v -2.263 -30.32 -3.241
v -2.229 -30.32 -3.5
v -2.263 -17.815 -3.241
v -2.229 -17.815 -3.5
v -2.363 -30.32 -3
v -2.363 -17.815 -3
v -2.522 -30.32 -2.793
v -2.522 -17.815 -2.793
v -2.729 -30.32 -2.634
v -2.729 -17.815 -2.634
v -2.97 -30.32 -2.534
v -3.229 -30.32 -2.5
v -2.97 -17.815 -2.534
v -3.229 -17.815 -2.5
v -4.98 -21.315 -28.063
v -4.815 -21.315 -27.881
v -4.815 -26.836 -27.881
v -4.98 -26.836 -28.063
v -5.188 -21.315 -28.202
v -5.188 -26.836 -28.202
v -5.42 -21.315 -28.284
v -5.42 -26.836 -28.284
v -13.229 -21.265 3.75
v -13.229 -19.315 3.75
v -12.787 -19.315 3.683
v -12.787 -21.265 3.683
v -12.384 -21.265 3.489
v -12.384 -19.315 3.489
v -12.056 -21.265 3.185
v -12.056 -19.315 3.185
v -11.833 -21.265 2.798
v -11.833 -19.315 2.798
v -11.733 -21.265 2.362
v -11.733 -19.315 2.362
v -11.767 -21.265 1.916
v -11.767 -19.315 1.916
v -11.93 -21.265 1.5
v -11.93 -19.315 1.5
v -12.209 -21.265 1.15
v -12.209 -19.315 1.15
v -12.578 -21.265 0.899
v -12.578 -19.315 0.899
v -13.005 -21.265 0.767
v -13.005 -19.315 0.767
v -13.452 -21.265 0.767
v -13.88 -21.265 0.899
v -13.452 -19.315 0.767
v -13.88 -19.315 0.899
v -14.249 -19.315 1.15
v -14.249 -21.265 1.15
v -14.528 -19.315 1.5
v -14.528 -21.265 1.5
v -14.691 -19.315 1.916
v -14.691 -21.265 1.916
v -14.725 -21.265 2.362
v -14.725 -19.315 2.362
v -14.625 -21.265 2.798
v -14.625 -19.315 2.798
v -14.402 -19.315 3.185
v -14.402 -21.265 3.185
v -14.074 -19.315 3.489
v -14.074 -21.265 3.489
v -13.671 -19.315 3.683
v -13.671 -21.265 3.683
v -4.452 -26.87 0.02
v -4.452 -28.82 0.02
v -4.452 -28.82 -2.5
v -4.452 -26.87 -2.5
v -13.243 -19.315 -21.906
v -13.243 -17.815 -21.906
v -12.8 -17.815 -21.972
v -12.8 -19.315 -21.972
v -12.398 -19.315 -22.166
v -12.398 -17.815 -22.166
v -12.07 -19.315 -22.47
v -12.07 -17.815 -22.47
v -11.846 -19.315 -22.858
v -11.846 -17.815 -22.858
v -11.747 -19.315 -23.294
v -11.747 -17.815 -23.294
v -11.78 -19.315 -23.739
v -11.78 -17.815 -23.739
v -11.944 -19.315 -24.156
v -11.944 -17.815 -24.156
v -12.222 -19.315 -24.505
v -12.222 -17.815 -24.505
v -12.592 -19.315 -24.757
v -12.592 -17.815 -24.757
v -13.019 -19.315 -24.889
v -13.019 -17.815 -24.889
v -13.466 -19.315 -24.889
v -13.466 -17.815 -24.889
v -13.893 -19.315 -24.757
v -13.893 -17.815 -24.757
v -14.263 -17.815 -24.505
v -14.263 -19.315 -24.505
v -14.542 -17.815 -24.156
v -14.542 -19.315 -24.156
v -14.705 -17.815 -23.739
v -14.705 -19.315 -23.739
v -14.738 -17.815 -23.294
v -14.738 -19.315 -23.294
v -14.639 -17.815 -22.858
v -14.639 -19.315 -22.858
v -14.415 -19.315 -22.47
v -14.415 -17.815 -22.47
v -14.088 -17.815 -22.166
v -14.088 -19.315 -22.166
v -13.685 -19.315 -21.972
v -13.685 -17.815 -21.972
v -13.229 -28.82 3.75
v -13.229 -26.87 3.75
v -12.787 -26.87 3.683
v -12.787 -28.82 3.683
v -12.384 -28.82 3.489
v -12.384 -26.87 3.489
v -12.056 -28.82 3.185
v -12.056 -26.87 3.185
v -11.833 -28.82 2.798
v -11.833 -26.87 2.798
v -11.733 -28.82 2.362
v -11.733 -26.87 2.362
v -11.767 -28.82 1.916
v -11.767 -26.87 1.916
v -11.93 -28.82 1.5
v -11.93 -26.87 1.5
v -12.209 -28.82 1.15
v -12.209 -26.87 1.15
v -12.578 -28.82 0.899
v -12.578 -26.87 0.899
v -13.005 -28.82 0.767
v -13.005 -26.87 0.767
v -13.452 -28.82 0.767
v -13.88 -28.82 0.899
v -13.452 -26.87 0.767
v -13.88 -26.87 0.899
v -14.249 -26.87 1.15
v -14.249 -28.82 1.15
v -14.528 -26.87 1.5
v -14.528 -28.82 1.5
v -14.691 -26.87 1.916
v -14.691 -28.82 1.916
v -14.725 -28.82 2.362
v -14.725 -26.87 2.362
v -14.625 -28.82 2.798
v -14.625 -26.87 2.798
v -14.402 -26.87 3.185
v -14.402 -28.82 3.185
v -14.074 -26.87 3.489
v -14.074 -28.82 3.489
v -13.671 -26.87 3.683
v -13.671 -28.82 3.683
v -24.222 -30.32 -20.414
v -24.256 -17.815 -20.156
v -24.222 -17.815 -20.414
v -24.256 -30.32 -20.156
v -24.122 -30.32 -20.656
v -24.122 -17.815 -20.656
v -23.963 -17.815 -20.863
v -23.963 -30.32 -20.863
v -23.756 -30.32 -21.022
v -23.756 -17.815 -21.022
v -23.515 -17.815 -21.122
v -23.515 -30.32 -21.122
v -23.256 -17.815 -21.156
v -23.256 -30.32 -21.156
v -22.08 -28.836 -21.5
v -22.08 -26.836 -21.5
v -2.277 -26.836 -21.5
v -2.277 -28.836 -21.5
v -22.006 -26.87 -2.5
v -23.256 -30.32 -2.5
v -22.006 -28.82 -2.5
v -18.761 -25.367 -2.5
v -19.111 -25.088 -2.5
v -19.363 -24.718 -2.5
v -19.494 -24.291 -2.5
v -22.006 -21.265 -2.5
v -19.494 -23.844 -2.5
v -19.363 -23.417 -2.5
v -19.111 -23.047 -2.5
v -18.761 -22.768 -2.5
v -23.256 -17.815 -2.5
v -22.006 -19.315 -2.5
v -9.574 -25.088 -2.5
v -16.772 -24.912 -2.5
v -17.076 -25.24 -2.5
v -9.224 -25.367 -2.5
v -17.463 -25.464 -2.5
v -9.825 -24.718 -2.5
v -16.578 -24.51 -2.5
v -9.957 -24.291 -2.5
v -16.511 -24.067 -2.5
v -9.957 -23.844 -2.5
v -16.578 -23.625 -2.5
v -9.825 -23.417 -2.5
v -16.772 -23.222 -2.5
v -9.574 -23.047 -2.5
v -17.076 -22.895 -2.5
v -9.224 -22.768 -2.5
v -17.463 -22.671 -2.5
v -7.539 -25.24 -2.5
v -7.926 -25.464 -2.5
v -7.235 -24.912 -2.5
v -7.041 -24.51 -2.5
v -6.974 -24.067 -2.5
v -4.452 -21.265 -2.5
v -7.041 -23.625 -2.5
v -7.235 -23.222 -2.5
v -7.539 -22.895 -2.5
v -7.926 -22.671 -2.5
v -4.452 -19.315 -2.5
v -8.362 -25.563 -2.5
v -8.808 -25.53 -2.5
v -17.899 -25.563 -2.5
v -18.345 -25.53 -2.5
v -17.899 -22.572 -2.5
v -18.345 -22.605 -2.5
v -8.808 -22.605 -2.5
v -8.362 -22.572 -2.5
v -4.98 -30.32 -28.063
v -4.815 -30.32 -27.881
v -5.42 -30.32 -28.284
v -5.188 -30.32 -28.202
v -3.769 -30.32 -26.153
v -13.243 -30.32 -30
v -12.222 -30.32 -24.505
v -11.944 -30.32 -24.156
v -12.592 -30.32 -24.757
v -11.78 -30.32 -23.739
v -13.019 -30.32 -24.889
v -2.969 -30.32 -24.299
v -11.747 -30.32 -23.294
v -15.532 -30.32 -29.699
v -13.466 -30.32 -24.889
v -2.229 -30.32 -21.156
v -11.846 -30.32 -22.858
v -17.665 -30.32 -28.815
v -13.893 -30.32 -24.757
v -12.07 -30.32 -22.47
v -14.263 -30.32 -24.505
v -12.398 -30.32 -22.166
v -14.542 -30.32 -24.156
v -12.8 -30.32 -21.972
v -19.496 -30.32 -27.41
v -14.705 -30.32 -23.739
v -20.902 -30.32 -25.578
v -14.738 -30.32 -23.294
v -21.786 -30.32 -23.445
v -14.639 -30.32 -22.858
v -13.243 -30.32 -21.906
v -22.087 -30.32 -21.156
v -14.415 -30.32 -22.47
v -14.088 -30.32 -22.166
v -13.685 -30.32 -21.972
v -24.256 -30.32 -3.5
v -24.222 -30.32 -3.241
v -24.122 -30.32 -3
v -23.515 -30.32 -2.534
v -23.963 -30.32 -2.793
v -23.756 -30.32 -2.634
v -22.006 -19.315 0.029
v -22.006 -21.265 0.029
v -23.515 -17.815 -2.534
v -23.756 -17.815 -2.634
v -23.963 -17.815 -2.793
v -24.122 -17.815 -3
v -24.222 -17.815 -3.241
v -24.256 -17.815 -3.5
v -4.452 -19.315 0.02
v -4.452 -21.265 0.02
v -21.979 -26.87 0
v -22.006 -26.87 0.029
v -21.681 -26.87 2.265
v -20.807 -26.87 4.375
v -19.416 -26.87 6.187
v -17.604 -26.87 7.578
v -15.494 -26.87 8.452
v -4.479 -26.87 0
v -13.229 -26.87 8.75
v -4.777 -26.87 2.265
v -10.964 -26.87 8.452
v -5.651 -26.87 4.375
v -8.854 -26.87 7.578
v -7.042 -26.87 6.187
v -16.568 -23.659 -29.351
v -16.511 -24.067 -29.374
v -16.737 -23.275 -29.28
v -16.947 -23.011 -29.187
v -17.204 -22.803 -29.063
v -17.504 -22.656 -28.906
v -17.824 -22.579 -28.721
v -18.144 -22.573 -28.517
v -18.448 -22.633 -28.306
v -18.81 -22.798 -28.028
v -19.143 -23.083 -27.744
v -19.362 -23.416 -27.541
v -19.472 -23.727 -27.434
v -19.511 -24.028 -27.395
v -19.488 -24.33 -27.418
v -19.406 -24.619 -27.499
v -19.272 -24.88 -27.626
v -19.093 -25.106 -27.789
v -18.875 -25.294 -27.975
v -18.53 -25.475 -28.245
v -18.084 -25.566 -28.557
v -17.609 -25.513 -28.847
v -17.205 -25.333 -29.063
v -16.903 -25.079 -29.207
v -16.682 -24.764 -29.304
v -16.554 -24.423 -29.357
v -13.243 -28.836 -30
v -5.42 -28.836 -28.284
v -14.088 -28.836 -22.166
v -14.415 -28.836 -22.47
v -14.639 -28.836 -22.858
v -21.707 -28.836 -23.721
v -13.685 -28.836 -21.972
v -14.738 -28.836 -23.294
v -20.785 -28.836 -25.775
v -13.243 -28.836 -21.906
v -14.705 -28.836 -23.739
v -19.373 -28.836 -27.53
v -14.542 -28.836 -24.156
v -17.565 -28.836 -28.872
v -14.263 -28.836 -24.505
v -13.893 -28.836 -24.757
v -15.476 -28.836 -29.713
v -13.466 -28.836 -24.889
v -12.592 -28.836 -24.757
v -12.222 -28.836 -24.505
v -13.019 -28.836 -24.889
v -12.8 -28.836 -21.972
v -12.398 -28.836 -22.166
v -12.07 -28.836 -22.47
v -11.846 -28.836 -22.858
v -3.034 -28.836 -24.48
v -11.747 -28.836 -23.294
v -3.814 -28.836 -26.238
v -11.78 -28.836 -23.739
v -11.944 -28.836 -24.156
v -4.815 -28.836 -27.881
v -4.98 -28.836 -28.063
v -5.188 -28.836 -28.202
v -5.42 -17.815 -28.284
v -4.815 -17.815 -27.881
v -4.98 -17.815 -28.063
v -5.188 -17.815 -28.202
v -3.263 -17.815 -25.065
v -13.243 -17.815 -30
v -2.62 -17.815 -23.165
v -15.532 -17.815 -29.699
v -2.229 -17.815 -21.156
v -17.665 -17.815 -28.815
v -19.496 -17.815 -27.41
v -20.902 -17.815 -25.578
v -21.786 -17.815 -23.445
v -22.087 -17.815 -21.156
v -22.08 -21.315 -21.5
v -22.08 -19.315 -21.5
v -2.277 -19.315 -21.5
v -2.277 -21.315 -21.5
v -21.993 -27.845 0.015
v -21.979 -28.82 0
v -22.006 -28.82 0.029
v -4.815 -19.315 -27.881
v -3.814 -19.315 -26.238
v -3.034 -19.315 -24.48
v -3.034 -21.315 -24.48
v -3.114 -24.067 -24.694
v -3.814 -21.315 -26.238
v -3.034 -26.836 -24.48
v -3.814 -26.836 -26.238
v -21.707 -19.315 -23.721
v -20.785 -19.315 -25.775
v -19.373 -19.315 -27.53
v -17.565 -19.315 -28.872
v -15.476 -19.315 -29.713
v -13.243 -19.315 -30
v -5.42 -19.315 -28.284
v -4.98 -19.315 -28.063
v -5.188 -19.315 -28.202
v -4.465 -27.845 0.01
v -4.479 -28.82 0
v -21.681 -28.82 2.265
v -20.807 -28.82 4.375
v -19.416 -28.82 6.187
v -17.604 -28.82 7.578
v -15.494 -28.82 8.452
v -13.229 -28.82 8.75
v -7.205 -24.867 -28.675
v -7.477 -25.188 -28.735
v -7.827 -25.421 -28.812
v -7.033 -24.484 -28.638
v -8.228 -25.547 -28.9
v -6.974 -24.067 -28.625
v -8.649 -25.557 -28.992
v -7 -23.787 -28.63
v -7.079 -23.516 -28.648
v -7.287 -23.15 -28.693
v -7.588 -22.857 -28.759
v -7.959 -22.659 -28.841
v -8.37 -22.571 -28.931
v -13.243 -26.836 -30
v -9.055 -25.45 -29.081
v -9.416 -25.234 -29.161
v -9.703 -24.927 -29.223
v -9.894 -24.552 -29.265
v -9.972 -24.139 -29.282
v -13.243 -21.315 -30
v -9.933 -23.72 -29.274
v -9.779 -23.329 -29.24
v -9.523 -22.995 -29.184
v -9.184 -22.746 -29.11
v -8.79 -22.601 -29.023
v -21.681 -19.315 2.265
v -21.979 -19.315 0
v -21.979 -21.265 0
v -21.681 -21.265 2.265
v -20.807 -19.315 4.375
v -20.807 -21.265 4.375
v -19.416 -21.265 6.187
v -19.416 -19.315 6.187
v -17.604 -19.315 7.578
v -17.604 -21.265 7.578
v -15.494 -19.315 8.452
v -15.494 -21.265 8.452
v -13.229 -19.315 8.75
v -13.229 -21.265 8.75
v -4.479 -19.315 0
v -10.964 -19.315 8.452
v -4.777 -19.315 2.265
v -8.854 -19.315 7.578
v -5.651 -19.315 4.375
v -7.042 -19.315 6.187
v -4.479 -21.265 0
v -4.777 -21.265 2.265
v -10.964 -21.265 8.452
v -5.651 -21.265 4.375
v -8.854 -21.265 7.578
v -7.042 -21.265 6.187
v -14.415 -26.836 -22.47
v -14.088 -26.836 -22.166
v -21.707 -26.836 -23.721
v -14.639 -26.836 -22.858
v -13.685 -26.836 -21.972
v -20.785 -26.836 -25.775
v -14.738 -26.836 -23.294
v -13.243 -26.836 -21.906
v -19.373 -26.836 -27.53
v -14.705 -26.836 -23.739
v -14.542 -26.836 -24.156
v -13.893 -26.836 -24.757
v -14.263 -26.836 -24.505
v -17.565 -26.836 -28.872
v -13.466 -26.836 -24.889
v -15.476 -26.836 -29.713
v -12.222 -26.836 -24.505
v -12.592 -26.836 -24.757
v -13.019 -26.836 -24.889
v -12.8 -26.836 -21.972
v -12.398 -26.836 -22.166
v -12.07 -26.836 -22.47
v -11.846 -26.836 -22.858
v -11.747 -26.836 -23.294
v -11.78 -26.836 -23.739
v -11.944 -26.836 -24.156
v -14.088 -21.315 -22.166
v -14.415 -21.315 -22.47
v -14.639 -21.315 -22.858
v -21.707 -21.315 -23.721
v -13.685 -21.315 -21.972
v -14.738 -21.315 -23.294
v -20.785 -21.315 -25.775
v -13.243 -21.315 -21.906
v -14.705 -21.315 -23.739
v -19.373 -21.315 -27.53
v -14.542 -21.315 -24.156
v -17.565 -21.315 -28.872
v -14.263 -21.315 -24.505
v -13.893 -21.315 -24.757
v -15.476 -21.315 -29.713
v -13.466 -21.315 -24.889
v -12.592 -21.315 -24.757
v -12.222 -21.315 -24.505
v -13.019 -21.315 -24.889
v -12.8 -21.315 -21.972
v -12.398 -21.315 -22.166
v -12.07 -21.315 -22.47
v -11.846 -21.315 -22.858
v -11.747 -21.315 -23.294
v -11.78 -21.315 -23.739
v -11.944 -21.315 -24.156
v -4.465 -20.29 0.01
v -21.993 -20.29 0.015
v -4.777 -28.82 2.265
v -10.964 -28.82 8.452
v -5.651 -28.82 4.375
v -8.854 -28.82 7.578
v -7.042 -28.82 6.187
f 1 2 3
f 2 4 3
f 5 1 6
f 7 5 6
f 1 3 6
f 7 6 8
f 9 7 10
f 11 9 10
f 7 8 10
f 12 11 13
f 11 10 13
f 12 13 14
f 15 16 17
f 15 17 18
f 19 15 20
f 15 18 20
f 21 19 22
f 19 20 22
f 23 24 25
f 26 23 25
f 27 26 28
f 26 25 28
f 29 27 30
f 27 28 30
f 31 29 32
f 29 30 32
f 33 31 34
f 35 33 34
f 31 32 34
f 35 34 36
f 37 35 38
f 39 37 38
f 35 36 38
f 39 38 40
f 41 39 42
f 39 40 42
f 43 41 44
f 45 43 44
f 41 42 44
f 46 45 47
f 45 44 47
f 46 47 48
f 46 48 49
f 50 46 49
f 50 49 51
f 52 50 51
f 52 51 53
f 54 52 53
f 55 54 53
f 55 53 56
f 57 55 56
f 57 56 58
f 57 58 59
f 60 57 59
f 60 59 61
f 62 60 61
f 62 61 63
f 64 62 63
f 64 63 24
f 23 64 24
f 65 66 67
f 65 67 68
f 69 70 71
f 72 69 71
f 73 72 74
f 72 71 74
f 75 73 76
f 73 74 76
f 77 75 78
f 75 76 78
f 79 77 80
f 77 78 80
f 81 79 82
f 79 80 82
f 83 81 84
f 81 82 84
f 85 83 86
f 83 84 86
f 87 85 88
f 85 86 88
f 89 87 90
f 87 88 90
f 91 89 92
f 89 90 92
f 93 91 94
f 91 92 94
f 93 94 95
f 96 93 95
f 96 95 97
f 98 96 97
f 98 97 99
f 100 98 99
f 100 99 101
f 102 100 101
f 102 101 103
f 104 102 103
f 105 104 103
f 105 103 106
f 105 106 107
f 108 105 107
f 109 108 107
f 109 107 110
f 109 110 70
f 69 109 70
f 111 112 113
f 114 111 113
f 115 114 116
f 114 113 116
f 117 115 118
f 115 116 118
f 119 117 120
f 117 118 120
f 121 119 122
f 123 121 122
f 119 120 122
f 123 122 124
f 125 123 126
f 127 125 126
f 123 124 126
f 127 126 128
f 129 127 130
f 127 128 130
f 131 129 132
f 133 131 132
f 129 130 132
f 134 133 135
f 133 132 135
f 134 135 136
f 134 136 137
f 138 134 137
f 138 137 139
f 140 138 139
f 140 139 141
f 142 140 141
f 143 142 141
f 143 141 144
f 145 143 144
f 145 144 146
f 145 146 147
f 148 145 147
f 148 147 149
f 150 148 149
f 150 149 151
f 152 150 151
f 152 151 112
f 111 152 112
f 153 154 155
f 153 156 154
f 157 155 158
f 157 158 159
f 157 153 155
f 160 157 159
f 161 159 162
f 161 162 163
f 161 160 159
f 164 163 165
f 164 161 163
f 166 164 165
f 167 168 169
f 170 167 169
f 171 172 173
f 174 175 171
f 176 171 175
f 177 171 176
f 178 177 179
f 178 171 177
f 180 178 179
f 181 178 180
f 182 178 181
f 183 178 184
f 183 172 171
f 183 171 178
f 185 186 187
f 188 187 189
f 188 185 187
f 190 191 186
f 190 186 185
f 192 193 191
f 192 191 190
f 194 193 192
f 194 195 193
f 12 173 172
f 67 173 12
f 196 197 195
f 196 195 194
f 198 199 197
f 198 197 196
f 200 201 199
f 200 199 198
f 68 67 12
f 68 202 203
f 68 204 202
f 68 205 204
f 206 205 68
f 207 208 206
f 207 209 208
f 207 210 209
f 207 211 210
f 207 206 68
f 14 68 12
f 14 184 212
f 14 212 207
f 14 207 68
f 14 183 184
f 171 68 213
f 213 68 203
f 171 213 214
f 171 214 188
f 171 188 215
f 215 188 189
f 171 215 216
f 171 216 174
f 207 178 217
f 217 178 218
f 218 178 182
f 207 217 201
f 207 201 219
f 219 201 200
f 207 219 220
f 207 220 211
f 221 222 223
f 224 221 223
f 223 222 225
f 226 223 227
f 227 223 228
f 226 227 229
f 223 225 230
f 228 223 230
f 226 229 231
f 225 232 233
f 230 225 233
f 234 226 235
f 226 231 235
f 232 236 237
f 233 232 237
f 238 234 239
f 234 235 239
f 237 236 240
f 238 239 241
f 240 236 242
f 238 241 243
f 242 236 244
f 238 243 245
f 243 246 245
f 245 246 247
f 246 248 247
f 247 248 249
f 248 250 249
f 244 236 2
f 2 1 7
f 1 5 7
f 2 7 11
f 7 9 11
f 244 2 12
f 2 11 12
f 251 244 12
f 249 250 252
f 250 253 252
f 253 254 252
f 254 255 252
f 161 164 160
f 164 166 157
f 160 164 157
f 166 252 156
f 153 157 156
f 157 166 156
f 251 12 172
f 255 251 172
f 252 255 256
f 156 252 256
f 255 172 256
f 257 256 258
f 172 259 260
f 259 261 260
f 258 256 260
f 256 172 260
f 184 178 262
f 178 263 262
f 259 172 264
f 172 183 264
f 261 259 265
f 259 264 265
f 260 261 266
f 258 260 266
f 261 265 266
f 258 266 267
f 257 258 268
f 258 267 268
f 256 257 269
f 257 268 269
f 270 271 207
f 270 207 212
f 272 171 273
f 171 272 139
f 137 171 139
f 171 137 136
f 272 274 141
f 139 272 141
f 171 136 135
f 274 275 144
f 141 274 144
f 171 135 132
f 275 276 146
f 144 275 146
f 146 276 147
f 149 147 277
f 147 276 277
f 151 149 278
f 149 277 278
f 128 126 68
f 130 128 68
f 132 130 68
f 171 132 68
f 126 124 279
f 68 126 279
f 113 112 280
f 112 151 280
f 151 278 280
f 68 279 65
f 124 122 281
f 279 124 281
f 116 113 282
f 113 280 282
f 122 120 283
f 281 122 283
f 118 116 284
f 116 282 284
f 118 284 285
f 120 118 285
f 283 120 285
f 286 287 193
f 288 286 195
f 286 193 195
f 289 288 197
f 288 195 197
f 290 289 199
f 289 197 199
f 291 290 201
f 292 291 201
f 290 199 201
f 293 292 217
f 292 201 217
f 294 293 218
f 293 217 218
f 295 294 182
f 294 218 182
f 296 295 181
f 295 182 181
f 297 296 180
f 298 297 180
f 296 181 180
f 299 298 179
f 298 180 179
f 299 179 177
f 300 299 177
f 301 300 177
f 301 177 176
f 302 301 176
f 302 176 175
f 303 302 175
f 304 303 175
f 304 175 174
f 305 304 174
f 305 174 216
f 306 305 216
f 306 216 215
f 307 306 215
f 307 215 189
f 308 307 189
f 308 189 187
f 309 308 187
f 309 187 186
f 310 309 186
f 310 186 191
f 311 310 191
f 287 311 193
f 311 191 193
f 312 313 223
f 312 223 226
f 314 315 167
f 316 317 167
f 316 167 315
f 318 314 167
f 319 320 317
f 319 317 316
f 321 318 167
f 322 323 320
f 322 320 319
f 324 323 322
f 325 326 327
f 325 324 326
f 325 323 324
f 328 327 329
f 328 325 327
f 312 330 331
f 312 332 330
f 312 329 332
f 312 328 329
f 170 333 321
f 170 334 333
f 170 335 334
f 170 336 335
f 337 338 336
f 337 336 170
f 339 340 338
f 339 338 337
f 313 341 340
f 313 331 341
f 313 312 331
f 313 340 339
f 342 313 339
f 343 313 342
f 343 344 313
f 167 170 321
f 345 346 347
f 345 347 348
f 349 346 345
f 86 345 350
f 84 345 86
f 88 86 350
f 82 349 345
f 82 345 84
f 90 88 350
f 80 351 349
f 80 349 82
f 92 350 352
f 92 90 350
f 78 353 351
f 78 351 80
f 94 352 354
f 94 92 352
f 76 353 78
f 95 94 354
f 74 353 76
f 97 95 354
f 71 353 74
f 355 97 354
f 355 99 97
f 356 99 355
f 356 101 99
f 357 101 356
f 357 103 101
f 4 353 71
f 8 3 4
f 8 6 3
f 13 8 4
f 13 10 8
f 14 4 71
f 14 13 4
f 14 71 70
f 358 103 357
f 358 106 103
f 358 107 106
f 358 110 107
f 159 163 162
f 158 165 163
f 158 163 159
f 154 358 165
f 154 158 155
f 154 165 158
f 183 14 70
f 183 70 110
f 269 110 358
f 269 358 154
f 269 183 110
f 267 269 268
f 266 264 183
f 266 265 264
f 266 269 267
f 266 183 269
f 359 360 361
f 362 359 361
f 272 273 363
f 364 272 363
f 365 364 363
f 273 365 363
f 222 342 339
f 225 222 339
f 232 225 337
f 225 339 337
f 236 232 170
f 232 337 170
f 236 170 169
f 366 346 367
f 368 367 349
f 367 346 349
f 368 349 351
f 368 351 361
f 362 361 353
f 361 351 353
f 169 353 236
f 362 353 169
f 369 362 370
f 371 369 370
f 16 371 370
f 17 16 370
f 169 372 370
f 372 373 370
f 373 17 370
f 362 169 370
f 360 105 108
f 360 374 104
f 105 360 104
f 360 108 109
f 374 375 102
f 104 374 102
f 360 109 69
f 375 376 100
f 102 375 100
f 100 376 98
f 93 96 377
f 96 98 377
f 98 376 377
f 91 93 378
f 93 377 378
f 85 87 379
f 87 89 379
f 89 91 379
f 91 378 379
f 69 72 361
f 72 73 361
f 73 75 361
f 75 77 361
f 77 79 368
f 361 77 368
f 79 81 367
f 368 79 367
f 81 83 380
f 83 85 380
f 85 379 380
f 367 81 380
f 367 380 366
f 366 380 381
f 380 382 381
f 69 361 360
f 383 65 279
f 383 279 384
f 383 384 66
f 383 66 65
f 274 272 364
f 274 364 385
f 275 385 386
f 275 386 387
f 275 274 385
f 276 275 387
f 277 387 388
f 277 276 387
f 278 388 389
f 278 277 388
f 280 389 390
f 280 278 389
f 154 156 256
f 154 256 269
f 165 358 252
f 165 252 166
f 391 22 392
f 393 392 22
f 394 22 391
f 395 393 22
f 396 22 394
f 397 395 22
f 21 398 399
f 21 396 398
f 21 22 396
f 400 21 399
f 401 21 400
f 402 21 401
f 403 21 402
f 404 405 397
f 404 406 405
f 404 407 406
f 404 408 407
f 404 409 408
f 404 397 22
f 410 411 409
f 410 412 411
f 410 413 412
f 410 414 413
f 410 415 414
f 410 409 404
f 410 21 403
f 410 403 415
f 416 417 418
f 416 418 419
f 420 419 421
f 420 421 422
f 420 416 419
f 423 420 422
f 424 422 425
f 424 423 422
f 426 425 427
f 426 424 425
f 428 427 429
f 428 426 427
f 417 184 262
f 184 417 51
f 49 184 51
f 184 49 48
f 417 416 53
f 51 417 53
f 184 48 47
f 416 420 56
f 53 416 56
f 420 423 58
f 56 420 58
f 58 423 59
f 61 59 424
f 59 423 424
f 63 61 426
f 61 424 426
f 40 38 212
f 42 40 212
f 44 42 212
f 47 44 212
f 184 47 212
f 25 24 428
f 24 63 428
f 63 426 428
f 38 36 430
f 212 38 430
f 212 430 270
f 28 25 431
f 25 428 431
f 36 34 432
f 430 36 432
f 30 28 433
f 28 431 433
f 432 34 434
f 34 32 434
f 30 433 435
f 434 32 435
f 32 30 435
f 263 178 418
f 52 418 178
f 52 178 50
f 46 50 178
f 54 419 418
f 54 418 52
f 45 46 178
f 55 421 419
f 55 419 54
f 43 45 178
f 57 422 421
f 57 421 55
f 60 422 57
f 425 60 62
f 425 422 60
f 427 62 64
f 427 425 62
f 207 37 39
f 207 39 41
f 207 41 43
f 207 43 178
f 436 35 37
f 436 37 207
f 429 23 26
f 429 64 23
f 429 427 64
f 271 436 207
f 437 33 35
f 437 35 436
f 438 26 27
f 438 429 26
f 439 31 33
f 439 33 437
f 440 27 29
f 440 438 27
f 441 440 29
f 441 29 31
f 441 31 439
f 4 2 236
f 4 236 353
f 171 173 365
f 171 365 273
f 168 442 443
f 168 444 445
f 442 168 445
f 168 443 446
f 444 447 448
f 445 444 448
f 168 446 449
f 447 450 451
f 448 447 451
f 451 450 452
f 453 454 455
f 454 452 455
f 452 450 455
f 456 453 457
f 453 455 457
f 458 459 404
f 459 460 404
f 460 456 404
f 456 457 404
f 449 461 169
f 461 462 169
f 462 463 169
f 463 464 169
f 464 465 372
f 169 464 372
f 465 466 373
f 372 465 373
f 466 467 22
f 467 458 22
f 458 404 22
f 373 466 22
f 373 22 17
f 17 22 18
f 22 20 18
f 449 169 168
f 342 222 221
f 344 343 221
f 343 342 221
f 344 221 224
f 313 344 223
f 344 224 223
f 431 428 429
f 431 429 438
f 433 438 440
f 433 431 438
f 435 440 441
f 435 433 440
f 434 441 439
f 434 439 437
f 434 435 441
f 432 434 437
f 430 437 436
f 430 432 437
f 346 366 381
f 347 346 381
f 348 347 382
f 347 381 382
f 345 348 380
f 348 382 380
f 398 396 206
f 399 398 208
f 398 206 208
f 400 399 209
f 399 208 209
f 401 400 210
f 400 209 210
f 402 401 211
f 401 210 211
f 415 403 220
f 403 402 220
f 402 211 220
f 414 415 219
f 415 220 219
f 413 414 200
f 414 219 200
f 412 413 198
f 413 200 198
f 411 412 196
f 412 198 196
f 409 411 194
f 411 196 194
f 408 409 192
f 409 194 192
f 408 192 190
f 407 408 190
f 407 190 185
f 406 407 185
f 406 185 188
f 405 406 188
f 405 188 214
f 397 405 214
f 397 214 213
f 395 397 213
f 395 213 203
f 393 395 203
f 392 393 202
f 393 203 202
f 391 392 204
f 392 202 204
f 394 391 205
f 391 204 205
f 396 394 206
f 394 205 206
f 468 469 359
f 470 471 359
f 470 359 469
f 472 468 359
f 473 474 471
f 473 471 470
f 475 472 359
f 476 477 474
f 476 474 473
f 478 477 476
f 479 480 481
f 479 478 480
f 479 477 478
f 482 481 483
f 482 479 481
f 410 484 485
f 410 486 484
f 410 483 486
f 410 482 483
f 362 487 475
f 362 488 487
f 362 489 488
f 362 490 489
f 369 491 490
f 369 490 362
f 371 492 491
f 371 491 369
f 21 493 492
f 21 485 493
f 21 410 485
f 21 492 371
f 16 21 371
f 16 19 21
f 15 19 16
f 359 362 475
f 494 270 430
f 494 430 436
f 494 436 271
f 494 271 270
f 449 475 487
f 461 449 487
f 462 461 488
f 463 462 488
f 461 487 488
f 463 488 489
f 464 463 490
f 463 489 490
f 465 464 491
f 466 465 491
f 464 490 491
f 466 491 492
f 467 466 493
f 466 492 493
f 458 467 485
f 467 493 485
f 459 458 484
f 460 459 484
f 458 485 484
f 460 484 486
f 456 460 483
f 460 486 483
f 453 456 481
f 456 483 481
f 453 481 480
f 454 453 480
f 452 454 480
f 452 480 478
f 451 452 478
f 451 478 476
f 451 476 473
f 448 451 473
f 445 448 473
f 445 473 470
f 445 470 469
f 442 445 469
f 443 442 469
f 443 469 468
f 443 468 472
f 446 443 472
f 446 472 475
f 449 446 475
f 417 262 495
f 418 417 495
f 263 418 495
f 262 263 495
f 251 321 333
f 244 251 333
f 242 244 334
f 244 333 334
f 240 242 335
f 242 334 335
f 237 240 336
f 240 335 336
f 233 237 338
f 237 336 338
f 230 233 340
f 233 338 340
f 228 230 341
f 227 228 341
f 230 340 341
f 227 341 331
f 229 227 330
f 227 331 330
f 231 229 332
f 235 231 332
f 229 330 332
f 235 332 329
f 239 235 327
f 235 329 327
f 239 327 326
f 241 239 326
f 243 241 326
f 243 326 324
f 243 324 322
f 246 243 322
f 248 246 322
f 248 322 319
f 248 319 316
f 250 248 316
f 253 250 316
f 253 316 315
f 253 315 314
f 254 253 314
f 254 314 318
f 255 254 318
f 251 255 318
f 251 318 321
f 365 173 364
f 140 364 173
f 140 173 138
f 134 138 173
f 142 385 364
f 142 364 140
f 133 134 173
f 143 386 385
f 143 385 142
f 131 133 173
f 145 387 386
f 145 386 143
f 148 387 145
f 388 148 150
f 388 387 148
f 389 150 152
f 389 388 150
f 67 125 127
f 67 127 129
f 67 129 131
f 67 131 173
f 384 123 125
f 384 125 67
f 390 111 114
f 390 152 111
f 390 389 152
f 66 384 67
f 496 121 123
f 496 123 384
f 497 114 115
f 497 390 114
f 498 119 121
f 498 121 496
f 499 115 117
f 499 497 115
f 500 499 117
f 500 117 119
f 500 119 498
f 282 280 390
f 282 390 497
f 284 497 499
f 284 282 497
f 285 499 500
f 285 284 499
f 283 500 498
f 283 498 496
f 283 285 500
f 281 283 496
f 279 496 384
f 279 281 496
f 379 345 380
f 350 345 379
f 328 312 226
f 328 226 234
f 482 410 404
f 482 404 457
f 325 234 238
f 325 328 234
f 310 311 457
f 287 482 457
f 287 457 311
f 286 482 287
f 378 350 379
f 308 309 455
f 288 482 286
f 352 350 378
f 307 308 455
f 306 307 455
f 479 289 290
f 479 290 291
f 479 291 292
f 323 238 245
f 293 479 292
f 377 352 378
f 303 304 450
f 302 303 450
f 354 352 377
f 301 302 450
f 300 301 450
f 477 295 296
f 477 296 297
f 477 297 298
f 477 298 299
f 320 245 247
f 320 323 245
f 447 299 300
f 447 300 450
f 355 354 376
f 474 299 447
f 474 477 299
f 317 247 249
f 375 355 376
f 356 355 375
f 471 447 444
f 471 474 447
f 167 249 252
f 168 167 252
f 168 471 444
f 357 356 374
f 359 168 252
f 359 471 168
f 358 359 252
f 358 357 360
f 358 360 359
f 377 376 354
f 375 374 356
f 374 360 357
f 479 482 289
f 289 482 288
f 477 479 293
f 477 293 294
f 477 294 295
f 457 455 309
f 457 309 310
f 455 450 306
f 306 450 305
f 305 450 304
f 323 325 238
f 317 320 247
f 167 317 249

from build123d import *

# Parameters (mm, degrees)
SKETCH2_W             = 17.554431489
SKETCH2_H             = 1.95
BOSS_EXTRUDE1_DEPTH   = 8.75
BOSS_EXTRUDE1_2_DEPTH = 8.75
CUT_EXTRUDE1_DEPTH    = 26.518349076
SKETCH4_W             = 22.027215745
SKETCH4_H             = 12.505427167
BOSS_EXTRUDE2_DEPTH   = 30
SKETCH5_R             = 1.5
CUT_EXTRUDE2_DEPTH    = 12
SKETCH6_W             = 22.027215745
SKETCH6_H             = 12.505427167
SKETCH6_W_2           = 17.554431489
SKETCH6_H_2           = 1.95
CUT_EXTRUDE3_DEPTH    = 2.5
SKETCH7_R             = 1.5
CUT_EXTRUDE4_DEPTH    = 13
SKETCH8_R             = 1.5
CUT_EXTRUDE5_DEPTH    = 28
FILLET3_R             = 1
SKETCH9_W             = 22.02721574
SKETCH9_H             = 2
CUT_EXTRUDE6_DEPTH    = 11


with BuildPart() as part:
    # Sketch2 → Boss-Extrude1 (new body)
    with BuildSketch(Plane.XY):
        with Locations((-13.228930986, -27.845183414)):
            Rectangle(SKETCH2_W, SKETCH2_H)
    extrude(amount=BOSS_EXTRUDE1_DEPTH)


with BuildPart() as body_2:
    # Sketch2 → Boss-Extrude1 2 (new body)
    with BuildSketch(Plane.XY):
        with Locations((-13.228930986, -20.289756247)):
            Rectangle(SKETCH2_W, SKETCH2_H)
    extrude(amount=BOSS_EXTRUDE1_2_DEPTH)


with BuildPart() as cut_extrude1_tool:
    # Sketch3 → Cut-Extrude1 (new, through all)
    with BuildSketch(Plane(origin=(0, -19.314756247, 0), x_dir=(1, 0, 0), z_dir=(0, 1, 0))):
        with BuildLine():
            ThreePointArc((-13.228930986, -8.75), (-7.041746651, -6.187184335), (-4.478930986, 0))
            add(Edge.make_bspline(
                [(-4.478930986, 0), (1.138349918, -4.151657709), (-4.451715242, -8.75)],
                knots=[0, 0, 0, 1, 1, 1], degree=2))
            add(Edge.make_bspline(
                [(-22.006146731, -8.75), (-13.228930986, -12.473510392), (-4.451715242, -8.75)],
                knots=[0, 0, 0, 1, 1, 1], degree=2))
            add(Edge.make_bspline(
                [(-21.978930986, 0), (-25.926969228, -4.242865138), (-22.006146731, -8.75)],
                knots=[0, 0, 0, 1, 1, 1], degree=2))
            ThreePointArc((-21.978930986, 0), (-19.416115322, -6.187184335), (-13.228930986, -8.75))
        make_face()
    extrude(amount=-CUT_EXTRUDE1_DEPTH)


with BuildPart() as part_1:
    add(part.part)

    # Cut-Extrude1: cut by cut_extrude1_tool
    add(cut_extrude1_tool.part, mode=Mode.SUBTRACT)



with BuildPart() as body_2_1:
    add(body_2.part)

    # Cut-Extrude1: cut by cut_extrude1_tool
    add(cut_extrude1_tool.part, mode=Mode.SUBTRACT)


with BuildPart() as part_2:
    add(part_1.part)

    add(body_2_1.part)  # Boss-Extrude2 merges body 2
    # Sketch4 → Boss-Extrude2 (add)
    with BuildSketch(Plane(origin=(0, 0, 0), x_dir=(-1, 0, 0), z_dir=(0, 0, -1))):
        with Locations((13.242538859, -24.067469831)):
            Rectangle(SKETCH4_W, SKETCH4_H)
    extrude(amount=BOSS_EXTRUDE2_DEPTH)

    # Sketch5 → Cut-Extrude2 (cut)
    with BuildSketch(Plane(origin=(0, -19.314756247, 0), x_dir=(1, 0, 0), z_dir=(0, 1, 0))):
        with Locations(Location((-13.228930986, -2.25, 0), (0, 0, 270))):
            Circle(SKETCH5_R)
    extrude(amount=-CUT_EXTRUDE2_DEPTH, mode=Mode.SUBTRACT)

    # Sketch6 → Cut-Extrude3 (cut)
    with BuildSketch(Plane.XY):
        with Locations((-13.242538859, -24.067469831)):
            Rectangle(SKETCH6_W, SKETCH6_H)
        with Locations((-13.228930986, -27.845183414)):
            Rectangle(SKETCH6_W_2, SKETCH6_H_2, mode=Mode.SUBTRACT)
        with Locations((-13.228930986, -20.289756247)):
            Rectangle(SKETCH6_W_2, SKETCH6_H_2, mode=Mode.SUBTRACT)
    extrude(amount=-CUT_EXTRUDE3_DEPTH, mode=Mode.SUBTRACT)

    # Sketch7 → Cut-Extrude4 (cut)
    with BuildSketch(Plane(origin=(0, -17.814756247, 0), x_dir=(1, 0, 0), z_dir=(0, 1, 0))):
        with Locations(Location((-13.242538859, 23.405672985, 0), (0, 0, 270))):
            Circle(SKETCH7_R)
        with BuildLine():
            Line((-22.086865874, 21.155672985), (-24.256146731, 21.155672985))
            add(Edge.make_bspline(
                [(-2.228930986, 21.155672985), (11.471530889, 27.189710441), (-11.765166974, 53.431279988), (-37.007876173, 21.523583672), (-24.256146731, 21.155672985)],
                knots=[0, 0, 0, 0, 0.52011282, 1, 1, 1, 1], degree=3))
            add(Edge.make_bspline(
                [(-5.046294073, 28.201654423), (-2.731488374, 25.068620188), (-2.228930986, 21.155672985)],
                knots=[0, 0, 0, 1, 1, 1], degree=2))
            Line((-5.046294073, 28.201654423), (-13.242538859, 30))
            ThreePointArc((-13.242538859, 30), (-19.496422466, 27.409556592), (-22.086865874, 21.155672985))
        make_face()
    extrude(amount=-CUT_EXTRUDE4_DEPTH, mode=Mode.SUBTRACT)

    # Sketch8 → Cut-Extrude5 (cut)
    with BuildSketch(Plane.XY.offset(-2.5)):
        with Locations((-18.011106811, -24.06746983)):
            Circle(SKETCH8_R)
        with Locations((-8.473970906, -24.06746983)):
            Circle(SKETCH8_R)
    extrude(amount=-CUT_EXTRUDE5_DEPTH, mode=Mode.SUBTRACT)

    # Fillet3
    fillet3_edges = [part_2.edges().sort_by_distance(p)[0] for p in [
        (-24.256146731, -24.06746983, -2.5),
        (-24.256146731, -24.06746983, -21.155672985),
        (-2.228930986, -24.06746983, -2.5),
        (-5.046294073, -24.06746983, -28.201654423),
    ]]
    fillet(fillet3_edges, radius=FILLET3_R)

    # Sketch9 → Cut-Extrude6 (cut)
    with BuildSketch(Plane.XY.offset(-32.5)):
        with Locations((-13.24253886, -20.31475625)):
            Rectangle(SKETCH9_W, SKETCH9_H)
        with Locations((-13.24253886, -27.836055834)):
            Rectangle(SKETCH9_W, SKETCH9_H)
    extrude(amount=CUT_EXTRUDE6_DEPTH, mode=Mode.SUBTRACT)


solid = part_2.part
